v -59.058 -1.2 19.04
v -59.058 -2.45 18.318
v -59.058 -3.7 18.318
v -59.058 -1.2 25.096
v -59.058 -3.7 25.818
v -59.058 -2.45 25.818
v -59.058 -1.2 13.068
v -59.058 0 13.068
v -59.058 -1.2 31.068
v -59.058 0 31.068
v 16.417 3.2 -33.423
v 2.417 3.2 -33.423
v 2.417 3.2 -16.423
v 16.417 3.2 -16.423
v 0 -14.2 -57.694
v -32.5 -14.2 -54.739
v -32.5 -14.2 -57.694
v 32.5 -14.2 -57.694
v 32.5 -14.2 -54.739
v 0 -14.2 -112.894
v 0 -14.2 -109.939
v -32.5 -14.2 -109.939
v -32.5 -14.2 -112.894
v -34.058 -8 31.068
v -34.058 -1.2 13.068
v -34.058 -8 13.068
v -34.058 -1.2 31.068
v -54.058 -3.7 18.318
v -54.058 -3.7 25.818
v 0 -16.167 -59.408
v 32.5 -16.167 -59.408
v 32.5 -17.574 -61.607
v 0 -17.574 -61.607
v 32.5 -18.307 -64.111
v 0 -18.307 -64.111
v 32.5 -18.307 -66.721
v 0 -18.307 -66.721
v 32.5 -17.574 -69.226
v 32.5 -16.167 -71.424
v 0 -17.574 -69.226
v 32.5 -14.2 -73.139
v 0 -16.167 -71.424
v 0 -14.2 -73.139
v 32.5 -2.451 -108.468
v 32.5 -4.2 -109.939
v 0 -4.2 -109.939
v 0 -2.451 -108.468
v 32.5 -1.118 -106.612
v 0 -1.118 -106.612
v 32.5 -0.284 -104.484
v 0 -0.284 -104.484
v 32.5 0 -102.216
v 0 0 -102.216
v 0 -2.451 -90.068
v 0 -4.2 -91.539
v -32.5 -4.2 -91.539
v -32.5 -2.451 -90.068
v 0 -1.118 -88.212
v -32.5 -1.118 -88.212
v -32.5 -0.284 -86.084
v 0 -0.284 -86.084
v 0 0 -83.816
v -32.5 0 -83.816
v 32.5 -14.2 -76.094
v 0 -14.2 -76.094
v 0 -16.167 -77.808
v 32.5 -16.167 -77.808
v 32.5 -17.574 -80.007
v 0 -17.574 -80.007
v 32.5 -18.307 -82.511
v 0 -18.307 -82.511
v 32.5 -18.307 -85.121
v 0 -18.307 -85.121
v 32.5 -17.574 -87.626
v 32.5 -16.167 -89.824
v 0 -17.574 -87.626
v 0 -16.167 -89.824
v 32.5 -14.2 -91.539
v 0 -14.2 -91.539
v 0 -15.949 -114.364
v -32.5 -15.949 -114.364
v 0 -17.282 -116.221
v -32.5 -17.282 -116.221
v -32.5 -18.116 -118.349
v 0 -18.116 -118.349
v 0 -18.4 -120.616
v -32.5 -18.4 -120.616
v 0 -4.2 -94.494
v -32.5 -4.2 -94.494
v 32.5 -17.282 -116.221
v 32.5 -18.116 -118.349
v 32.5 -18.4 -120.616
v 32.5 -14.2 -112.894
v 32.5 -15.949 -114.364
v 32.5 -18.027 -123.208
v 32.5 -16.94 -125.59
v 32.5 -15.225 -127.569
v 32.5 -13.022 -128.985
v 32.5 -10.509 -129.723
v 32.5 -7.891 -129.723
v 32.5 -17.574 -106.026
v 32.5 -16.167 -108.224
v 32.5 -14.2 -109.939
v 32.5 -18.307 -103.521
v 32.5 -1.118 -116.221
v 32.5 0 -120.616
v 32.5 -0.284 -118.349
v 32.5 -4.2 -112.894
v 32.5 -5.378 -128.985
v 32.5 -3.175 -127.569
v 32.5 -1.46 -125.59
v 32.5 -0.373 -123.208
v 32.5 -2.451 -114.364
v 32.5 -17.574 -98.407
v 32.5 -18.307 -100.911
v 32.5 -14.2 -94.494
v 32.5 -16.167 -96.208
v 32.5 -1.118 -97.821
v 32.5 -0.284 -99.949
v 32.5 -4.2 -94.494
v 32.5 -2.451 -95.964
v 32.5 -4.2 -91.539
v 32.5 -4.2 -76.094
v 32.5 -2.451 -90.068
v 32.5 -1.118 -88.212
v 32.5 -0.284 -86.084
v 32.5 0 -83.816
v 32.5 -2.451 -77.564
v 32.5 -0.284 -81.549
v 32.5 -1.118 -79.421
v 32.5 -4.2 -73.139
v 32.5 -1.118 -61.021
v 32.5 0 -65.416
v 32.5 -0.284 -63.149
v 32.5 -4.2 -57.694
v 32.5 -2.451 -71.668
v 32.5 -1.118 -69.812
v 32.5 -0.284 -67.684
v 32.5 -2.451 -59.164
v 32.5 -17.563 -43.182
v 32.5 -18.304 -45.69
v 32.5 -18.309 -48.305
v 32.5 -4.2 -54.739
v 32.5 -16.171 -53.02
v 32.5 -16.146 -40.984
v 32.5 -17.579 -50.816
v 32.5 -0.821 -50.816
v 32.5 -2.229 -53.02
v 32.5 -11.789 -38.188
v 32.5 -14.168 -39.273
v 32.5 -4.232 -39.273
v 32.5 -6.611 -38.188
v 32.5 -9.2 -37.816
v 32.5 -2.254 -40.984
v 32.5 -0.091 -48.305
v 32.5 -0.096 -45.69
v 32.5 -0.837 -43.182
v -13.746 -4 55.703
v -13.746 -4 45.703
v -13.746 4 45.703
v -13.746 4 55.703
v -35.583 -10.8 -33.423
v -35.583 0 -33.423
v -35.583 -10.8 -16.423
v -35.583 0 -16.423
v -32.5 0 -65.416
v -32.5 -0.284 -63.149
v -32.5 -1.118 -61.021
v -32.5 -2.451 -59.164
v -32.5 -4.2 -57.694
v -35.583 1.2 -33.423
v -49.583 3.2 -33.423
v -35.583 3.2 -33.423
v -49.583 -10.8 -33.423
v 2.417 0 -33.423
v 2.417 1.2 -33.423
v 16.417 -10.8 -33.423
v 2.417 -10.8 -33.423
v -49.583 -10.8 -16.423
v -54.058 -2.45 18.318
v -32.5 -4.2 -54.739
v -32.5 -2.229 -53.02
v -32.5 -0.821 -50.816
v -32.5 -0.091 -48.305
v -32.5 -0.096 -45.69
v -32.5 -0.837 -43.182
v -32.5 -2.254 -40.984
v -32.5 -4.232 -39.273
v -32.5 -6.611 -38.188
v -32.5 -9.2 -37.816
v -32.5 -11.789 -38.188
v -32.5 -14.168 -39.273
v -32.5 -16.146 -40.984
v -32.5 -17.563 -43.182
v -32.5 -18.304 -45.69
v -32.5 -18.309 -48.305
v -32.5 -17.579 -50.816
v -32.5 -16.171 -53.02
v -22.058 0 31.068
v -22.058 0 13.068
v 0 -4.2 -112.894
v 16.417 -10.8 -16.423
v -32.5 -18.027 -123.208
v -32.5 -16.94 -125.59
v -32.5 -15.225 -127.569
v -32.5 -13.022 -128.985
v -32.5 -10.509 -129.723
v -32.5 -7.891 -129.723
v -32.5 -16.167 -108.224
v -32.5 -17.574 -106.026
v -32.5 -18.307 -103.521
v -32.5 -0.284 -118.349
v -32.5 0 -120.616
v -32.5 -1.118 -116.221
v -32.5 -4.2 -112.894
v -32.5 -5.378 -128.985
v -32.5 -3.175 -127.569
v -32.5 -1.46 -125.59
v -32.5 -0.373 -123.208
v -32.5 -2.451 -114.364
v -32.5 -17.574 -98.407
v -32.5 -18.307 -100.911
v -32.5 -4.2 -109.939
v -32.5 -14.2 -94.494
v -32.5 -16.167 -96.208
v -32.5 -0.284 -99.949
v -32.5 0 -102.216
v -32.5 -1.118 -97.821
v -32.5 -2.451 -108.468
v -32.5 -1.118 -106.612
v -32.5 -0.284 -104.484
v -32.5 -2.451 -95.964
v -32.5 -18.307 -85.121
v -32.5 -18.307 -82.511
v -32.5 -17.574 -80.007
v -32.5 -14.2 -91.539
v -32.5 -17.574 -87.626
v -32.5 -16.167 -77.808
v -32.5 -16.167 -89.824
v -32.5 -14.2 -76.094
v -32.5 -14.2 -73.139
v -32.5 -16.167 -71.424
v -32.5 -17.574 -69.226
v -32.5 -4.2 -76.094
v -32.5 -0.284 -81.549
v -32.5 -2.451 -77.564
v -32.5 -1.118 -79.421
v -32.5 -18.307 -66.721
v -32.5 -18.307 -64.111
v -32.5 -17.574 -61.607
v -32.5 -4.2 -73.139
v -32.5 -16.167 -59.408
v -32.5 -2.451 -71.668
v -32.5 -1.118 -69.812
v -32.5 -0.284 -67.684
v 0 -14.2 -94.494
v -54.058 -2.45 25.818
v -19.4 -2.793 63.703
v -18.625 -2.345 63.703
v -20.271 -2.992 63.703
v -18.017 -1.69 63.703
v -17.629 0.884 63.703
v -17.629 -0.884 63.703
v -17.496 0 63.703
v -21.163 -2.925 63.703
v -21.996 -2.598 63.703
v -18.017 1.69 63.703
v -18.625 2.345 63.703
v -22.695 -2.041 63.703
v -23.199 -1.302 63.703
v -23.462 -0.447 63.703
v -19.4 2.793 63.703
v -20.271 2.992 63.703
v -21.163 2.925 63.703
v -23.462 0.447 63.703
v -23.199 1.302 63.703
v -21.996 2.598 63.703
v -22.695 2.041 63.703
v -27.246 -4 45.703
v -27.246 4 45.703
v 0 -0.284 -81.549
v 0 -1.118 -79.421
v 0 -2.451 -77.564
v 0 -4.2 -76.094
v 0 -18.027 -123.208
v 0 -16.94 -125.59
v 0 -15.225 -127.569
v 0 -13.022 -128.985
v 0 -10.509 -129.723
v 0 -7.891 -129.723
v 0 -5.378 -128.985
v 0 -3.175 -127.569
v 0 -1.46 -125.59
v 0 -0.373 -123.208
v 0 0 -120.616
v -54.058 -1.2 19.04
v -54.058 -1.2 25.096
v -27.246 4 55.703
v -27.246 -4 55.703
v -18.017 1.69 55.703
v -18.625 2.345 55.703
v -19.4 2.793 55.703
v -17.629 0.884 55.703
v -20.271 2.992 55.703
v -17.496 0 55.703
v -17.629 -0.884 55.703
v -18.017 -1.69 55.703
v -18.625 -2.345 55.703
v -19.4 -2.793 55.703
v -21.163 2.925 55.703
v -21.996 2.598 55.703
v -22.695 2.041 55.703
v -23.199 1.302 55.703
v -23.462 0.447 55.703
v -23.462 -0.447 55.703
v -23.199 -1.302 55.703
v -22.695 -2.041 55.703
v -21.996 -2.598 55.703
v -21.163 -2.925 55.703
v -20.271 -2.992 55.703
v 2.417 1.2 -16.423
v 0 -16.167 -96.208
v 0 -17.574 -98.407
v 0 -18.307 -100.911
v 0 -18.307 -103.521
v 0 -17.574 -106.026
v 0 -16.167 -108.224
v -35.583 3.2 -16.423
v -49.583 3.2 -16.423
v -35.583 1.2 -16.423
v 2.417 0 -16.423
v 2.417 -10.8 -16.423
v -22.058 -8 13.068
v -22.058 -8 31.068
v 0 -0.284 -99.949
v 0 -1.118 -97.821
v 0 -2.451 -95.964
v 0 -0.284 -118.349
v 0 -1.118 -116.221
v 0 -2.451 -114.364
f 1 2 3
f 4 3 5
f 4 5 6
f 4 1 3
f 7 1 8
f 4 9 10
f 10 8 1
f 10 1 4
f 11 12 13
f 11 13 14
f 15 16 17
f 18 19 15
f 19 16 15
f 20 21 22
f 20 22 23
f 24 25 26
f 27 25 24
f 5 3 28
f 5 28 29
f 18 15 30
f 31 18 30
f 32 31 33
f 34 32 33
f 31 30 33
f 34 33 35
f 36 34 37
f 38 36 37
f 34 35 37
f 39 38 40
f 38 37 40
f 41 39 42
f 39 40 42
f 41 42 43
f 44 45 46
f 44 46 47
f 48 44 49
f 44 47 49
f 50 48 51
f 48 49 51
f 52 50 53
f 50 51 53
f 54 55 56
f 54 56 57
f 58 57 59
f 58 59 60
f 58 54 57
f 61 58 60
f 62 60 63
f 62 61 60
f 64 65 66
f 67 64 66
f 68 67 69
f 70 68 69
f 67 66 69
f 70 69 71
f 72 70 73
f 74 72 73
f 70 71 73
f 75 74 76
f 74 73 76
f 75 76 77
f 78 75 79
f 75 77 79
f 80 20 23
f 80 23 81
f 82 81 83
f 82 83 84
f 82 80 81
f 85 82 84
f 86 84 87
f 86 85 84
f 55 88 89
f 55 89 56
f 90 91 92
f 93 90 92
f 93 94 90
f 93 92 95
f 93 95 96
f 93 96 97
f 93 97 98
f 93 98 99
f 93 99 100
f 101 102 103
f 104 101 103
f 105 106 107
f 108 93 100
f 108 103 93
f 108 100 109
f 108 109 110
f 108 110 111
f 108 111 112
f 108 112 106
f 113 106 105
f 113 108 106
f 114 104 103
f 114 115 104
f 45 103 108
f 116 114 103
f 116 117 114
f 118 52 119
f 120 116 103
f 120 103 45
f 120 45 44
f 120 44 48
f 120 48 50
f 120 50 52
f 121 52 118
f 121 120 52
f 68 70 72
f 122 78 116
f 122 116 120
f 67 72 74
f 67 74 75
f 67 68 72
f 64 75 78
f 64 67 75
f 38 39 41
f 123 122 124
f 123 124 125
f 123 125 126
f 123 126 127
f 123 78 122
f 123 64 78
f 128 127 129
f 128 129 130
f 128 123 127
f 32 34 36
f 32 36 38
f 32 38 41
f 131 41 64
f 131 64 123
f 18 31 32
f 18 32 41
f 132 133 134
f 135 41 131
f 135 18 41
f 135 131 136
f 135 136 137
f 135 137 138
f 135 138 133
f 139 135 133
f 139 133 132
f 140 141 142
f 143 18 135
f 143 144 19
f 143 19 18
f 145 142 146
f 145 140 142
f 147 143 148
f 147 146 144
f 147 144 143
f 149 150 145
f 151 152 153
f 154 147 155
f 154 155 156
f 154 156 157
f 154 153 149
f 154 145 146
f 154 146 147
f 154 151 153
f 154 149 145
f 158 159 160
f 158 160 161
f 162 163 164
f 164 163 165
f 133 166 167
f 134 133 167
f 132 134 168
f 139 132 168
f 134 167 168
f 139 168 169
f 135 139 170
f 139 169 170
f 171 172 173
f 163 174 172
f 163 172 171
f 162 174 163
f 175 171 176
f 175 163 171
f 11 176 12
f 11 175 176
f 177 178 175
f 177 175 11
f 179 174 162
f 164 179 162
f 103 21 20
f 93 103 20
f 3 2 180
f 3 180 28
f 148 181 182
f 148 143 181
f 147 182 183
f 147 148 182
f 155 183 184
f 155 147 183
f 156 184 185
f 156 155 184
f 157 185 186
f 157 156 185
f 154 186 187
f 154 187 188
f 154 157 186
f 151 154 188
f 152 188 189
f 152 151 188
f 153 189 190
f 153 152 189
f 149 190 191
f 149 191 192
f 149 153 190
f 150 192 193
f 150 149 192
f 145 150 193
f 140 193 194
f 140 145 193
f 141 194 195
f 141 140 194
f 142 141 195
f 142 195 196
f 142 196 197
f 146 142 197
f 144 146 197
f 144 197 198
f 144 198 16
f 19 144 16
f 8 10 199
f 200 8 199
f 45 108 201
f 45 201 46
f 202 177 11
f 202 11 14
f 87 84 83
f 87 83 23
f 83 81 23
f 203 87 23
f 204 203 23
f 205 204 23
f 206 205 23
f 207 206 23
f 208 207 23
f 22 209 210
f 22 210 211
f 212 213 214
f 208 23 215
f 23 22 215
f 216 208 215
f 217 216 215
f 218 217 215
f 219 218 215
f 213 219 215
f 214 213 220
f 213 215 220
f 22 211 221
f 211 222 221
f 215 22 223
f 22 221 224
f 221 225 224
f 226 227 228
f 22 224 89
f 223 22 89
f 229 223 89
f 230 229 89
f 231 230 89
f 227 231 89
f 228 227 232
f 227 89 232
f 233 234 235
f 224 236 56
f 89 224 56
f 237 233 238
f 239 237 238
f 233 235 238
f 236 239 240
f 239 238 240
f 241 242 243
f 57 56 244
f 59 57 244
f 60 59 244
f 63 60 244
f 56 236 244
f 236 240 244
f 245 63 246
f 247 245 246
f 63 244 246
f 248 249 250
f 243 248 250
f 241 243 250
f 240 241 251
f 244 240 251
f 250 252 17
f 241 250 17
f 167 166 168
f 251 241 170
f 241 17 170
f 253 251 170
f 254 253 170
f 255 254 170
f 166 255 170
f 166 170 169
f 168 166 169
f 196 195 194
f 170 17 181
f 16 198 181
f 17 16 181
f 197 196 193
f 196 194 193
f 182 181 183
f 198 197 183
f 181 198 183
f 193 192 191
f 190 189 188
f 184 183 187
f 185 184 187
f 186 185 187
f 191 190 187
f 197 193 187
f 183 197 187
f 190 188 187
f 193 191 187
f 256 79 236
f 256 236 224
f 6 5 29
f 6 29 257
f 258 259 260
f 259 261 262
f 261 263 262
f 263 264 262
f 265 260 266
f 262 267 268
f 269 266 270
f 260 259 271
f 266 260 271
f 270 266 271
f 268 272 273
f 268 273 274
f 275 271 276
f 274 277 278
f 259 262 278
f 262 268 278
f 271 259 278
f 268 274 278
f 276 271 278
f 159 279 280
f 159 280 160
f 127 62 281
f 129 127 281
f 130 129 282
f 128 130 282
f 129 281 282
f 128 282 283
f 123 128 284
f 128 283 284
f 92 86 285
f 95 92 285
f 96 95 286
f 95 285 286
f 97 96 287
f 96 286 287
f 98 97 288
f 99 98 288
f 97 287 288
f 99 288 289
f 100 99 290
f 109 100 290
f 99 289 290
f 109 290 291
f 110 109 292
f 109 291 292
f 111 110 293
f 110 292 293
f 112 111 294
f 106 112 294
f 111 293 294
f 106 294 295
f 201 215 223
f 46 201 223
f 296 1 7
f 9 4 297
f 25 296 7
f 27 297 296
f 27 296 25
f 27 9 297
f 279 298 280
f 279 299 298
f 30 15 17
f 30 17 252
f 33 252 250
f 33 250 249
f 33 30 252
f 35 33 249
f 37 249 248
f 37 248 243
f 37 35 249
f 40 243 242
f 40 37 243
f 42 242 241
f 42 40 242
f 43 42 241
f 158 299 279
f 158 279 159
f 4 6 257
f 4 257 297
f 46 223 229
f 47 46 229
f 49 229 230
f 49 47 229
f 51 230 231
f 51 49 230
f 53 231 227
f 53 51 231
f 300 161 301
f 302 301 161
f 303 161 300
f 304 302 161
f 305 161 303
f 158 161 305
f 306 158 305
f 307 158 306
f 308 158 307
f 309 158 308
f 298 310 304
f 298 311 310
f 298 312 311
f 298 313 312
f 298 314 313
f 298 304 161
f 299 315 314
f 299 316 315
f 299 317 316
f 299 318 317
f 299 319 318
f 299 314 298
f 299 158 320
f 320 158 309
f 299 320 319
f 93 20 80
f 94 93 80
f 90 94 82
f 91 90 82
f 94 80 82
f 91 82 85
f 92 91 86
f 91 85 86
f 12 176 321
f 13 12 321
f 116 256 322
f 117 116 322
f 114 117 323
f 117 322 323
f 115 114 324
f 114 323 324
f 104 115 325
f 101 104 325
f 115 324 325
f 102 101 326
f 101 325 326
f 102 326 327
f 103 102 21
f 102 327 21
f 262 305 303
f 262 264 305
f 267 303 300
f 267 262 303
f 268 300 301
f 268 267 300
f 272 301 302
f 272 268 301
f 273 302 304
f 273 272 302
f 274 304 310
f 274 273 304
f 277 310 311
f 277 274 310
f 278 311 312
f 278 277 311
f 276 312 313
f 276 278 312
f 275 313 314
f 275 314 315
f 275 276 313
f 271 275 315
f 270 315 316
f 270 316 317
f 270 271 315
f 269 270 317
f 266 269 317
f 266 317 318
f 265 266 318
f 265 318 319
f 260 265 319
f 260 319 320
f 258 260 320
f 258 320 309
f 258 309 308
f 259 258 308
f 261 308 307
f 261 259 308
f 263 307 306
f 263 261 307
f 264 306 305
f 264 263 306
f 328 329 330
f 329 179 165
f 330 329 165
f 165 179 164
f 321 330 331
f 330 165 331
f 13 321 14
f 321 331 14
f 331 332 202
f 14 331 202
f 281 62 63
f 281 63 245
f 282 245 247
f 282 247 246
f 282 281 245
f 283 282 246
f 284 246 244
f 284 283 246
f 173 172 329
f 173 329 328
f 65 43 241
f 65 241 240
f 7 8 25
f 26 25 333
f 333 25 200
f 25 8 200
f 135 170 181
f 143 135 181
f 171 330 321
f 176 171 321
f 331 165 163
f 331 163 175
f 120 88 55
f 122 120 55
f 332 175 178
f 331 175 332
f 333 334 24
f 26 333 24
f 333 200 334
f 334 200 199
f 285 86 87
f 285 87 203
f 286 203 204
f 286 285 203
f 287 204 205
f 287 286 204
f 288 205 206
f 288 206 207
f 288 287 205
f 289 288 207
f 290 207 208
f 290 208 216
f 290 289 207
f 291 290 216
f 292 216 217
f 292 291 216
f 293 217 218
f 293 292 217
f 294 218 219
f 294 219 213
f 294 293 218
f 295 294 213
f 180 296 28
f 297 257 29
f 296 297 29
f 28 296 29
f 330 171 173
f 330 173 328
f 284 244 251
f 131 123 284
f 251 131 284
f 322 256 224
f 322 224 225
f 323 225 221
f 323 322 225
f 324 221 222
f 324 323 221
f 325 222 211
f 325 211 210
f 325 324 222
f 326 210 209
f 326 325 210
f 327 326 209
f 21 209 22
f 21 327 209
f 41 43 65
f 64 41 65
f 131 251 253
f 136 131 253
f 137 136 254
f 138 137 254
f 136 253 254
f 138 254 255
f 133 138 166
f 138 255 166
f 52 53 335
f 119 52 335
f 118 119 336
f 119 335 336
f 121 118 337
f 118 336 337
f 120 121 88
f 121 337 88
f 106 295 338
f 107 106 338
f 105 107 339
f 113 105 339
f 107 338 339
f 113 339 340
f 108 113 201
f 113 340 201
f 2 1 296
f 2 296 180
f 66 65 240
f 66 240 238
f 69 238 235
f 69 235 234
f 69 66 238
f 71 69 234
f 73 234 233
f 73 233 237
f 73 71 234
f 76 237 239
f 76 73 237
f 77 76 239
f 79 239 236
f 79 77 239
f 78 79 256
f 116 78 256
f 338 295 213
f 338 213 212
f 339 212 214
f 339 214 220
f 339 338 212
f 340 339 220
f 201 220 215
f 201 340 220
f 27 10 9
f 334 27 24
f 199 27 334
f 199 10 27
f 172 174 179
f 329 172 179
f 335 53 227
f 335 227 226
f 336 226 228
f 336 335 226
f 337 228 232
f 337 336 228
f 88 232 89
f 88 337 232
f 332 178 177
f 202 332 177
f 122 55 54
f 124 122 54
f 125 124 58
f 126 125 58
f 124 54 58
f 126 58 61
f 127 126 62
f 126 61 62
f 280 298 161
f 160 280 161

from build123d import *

# Parameters (mm, degrees)
F2_DEPTH      = 32.5
F0_W          = 38
F0_H          = 17
F3_DEPTH      = 1.2
F0_W_2        = 37
F0_H_2        = 18
F4_DEPTH      = 1.2
F5_DEPTH      = 4
F0_W_3        = 3
F0_H_3        = 8
F0_W_4        = 14
F7_DEPTH      = 10.8
F7_DEPTH_BACK = 3.2
F9_DEPTH      = 5
F10_W         = 12
F10_H         = 18
F11_DEPTH     = 8


with BuildPart() as f2:
    # F1 (on Right) → F2 (new body, symmetric)
    with BuildSketch(Plane.YZ):
        with BuildLine():
            ThreePointArc((-4.2, -54.7390203901), (-1.1179210595, -51.4117787547), (0, -47.0163265596))
            Line((0, -47.0163265596), (-18.4, -47.0163265596))
            ThreePointArc((-18.4, -47.0163265596), (-17.2820789405, -51.4117787547), (-14.2, -54.7390203901))
            ThreePointArc((-14.2, -54.7390203901), (-11.8068387969, -55.8392734305), (-9.2000000533, -56.2163265596))
            ThreePointArc((-9.2000000533, -56.2163265596), (-6.5931612543, -55.8392734456), (-4.2, -54.7390203901))
        make_face()
        with BuildLine():
            Line((-18.4, -47.0163265596), (0, -47.0163265596))
            ThreePointArc((0, -47.0163265596), (-9.2, -37.8163265596), (-18.4, -47.0163265596))
        make_face()
        with BuildLine():
            Line((-4.2, -57.6936327291), (-4.2, -54.7390203901))
            ThreePointArc((-4.2, -54.7390203901), (-6.5931612543, -55.8392734456), (-9.2000000533, -56.2163265596))
            ThreePointArc((-9.2000000533, -56.2163265596), (-6.5931612543, -56.5933796736), (-4.2, -57.6936327291))
        make_face()
        with BuildLine():
            ThreePointArc((-9.2000000533, -56.2163265596), (-11.8068387969, -55.8392734305), (-14.2, -54.7390203901))
            Line((-14.2, -54.7390203901), (-14.2, -57.6936327291))
            ThreePointArc((-14.2, -57.6936327291), (-11.8068387969, -56.5933796887), (-9.2000000533, -56.2163265596))
        make_face()
        with BuildLine():
            ThreePointArc((-4.2, -57.6936327291), (-6.5931612543, -56.5933796736), (-9.2000000533, -56.2163265596))
            ThreePointArc((-9.2000000533, -56.2163265596), (-11.8068387969, -56.5933796887), (-14.2, -57.6936327291))
            Line((-14.2, -57.6936327291), (-14.2, -73.1390203901))
            ThreePointArc((-14.2, -73.1390203901), (-11.8068387713, -74.2392734381), (-9.2, -74.6163265596))
            ThreePointArc((-9.2, -74.6163265596), (-6.5931612287, -74.2392734381), (-4.2, -73.1390203901))
            Line((-4.2, -73.1390203901), (-4.2, -57.6936327291))
        make_face()
        with BuildLine():
            ThreePointArc((0, -65.4163265596), (-1.1179210595, -61.0208743644), (-4.2, -57.6936327291))
            Line((-4.2, -57.6936327291), (-4.2, -73.1390203901))
            ThreePointArc((-4.2, -73.1390203901), (-1.1179210595, -69.8117787547), (0, -65.4163265596))
        make_face()
        with BuildLine():
            Line((-14.2, -73.1390203901), (-14.2, -57.6936327291))
            ThreePointArc((-14.2, -57.6936327291), (-18.4, -65.4163265596), (-14.2, -73.1390203901))
        make_face()
        with BuildLine():
            Line((-4.2, -76.0936327291), (-4.2, -73.1390203901))
            ThreePointArc((-4.2, -73.1390203901), (-6.5931612287, -74.2392734381), (-9.2, -74.6163265596))
            ThreePointArc((-9.2, -74.6163265596), (-6.5931612287, -74.9933796811), (-4.2, -76.0936327291))
        make_face()
        with BuildLine():
            ThreePointArc((-9.2, -74.6163265596), (-11.8068387713, -74.2392734381), (-14.2, -73.1390203901))
            Line((-14.2, -73.1390203901), (-14.2, -76.0936327291))
            ThreePointArc((-14.2, -76.0936327291), (-11.8068387713, -74.9933796811), (-9.2, -74.6163265596))
        make_face()
        with BuildLine():
            ThreePointArc((-4.2, -76.0936327291), (-6.5931612287, -74.9933796811), (-9.2, -74.6163265596))
            ThreePointArc((-9.2, -74.6163265596), (-11.8068387713, -74.9933796811), (-14.2, -76.0936327291))
            Line((-14.2, -76.0936327291), (-14.2, -91.5390203901))
            ThreePointArc((-14.2, -91.5390203901), (-11.8068387713, -92.6392734381), (-9.2, -93.0163265596))
            ThreePointArc((-9.2, -93.0163265596), (-6.5931612287, -92.6392734381), (-4.2, -91.5390203901))
            Line((-4.2, -91.5390203901), (-4.2, -76.0936327291))
        make_face()
        with BuildLine():
            ThreePointArc((0, -83.8163265596), (-1.1179210595, -79.4208743644), (-4.2, -76.0936327291))
            Line((-4.2, -76.0936327291), (-4.2, -91.5390203901))
            ThreePointArc((-4.2, -91.5390203901), (-1.1179210595, -88.2117787547), (0, -83.8163265596))
        make_face()
        with BuildLine():
            Line((-14.2, -91.5390203901), (-14.2, -76.0936327291))
            ThreePointArc((-14.2, -76.0936327291), (-18.4, -83.8163265596), (-14.2, -91.5390203901))
        make_face()
        with BuildLine():
            Line((-4.2, -94.4936327291), (-4.2, -91.5390203901))
            ThreePointArc((-4.2, -91.5390203901), (-6.5931612287, -92.6392734381), (-9.2, -93.0163265596))
            ThreePointArc((-9.2, -93.0163265596), (-6.5931612287, -93.3933796811), (-4.2, -94.4936327291))
        make_face()
        with BuildLine():
            ThreePointArc((-9.2, -93.0163265596), (-11.8068387713, -92.6392734381), (-14.2, -91.5390203901))
            Line((-14.2, -91.5390203901), (-14.2, -94.4936327291))
            ThreePointArc((-14.2, -94.4936327291), (-11.8068387713, -93.3933796811), (-9.2, -93.0163265596))
        make_face()
        with BuildLine():
            ThreePointArc((-4.2, -94.4936327291), (-6.5931612287, -93.3933796811), (-9.2, -93.0163265596))
            ThreePointArc((-9.2, -93.0163265596), (-11.8068387713, -93.3933796811), (-14.2, -94.4936327291))
            Line((-14.2, -94.4936327291), (-14.2, -109.9390203901))
            ThreePointArc((-14.2, -109.9390203901), (-11.8068387713, -111.0392734381), (-9.2, -111.4163265596))
            ThreePointArc((-9.2, -111.4163265596), (-6.5931612287, -111.0392734381), (-4.2, -109.9390203901))
            Line((-4.2, -109.9390203901), (-4.2, -94.4936327291))
        make_face()
        with BuildLine():
            ThreePointArc((0, -102.2163265596), (-1.1179210595, -97.8208743644), (-4.2, -94.4936327291))
            Line((-4.2, -94.4936327291), (-4.2, -109.9390203901))
            ThreePointArc((-4.2, -109.9390203901), (-1.1179210595, -106.6117787547), (0, -102.2163265596))
        make_face()
        with BuildLine():
            Line((-14.2, -109.9390203901), (-14.2, -94.4936327291))
            ThreePointArc((-14.2, -94.4936327291), (-18.4, -102.2163265596), (-14.2, -109.9390203901))
        make_face()
        with BuildLine():
            Line((-4.2, -112.8936327291), (-4.2, -109.9390203901))
            ThreePointArc((-4.2, -109.9390203901), (-6.5931612287, -111.0392734381), (-9.2, -111.4163265596))
            ThreePointArc((-9.2, -111.4163265596), (-6.5931612287, -111.7933796811), (-4.2, -112.8936327291))
        make_face()
        with BuildLine():
            ThreePointArc((-9.2, -111.4163265596), (-11.8068387713, -111.0392734381), (-14.2, -109.9390203901))
            Line((-14.2, -109.9390203901), (-14.2, -112.8936327291))
            ThreePointArc((-14.2, -112.8936327291), (-11.8068387713, -111.7933796811), (-9.2, -111.4163265596))
        make_face()
        with BuildLine():
            ThreePointArc((0, -120.6163265596), (-1.1179210595, -116.2208743644), (-4.2, -112.8936327291))
            ThreePointArc((-4.2, -112.8936327291), (-6.5931612287, -111.7933796811), (-9.2, -111.4163265596))
            ThreePointArc((-9.2, -111.4163265596), (-11.8068387713, -111.7933796811), (-14.2, -112.8936327291))
            ThreePointArc((-14.2, -112.8936327291), (-17.2820789405, -116.2208743644), (-18.4, -120.6163265596))
            Line((-18.4, -120.6163265596), (0, -120.6163265596))
        make_face()
        with BuildLine():
            ThreePointArc((-18.4, -120.6163265596), (-9.2, -129.8163265596), (0, -120.6163265596))
            Line((0, -120.6163265596), (-18.4, -120.6163265596))
        make_face()
    extrude(amount=F2_DEPTH, both=True)


with BuildPart() as f3:
    # F0 (on Front) → F3 (new body)
    with BuildSketch(Plane.XZ):
        with Locations((-16.5825526439, -24.9226867318)):
            Rectangle(F0_W, F0_H)
    extrude(amount=-F3_DEPTH)

    # F0 (on Front) → F7 (join, two sides)
    with BuildSketch(Plane.XZ) as f7_sk:
        with Locations((-42.5825526439, -24.9226867318)):
            Rectangle(F0_W_4, F0_H)
        with Locations((9.4174473561, -24.9226867318)):
            Rectangle(F0_W_4, F0_H)
    extrude(amount=F7_DEPTH)
    extrude(f7_sk.sketch, amount=-F7_DEPTH_BACK)


with BuildPart() as f4:
    # F0 (on Front) → F4 (new body)
    with BuildSketch(Plane.XZ):
        with Locations((-40.5584470165, 22.0681699405)):
            Rectangle(F0_W_2, F0_H_2)
    extrude(amount=F4_DEPTH)

    # F8 (on face) → F9 (join)
    with BuildSketch(Plane(origin=(-59.0584470165, 0, 0), x_dir=(0, -1, 0), z_dir=(-1, 0, 0))):
        Polygon((2.45, 25.8181699405), (1.2, 25.096482104), (1.2, 19.039857777), (2.45, 18.3181699405), (3.7, 18.3181699405), (3.7, 25.8181699405), align=None)
    extrude(amount=-F9_DEPTH)

    # F10 (on face) → F11 (join)
    with BuildSketch(Plane(origin=(0, 0, 0), x_dir=(-1, 0, 0), z_dir=(0, 1, 0))):
        with Locations((28.0584470165, 22.0681699405)):
            Rectangle(F10_W, F10_H)
    extrude(amount=-F11_DEPTH)


with BuildPart() as f5:
    # F0 (on Front) → F5 (new body, symmetric)
    with BuildSketch(Plane.XZ):
        Polygon((-20.4956220064, 55.7029140266), (-27.2456220064, 55.7029140266), (-27.2456220064, 45.7029140266), (-13.7456220064, 45.7029140266), (-13.7456220064, 55.7029140266), (-17.4956220064, 55.7029140266), align=None)
    extrude(amount=F5_DEPTH, both=True)

    # F0 (on Front) → F6 (revolve)
    with BuildSketch(Plane.XZ):
        with Locations((-18.9956220064, 59.7029140266)):
            Rectangle(F0_W_3, F0_H_3)
    revolve(axis=Axis((-20.4956220064, 0, 59.7029140266), (0, 0, 1)))


solid = Compound([f2.part, f3.part, f4.part, f5.part])
